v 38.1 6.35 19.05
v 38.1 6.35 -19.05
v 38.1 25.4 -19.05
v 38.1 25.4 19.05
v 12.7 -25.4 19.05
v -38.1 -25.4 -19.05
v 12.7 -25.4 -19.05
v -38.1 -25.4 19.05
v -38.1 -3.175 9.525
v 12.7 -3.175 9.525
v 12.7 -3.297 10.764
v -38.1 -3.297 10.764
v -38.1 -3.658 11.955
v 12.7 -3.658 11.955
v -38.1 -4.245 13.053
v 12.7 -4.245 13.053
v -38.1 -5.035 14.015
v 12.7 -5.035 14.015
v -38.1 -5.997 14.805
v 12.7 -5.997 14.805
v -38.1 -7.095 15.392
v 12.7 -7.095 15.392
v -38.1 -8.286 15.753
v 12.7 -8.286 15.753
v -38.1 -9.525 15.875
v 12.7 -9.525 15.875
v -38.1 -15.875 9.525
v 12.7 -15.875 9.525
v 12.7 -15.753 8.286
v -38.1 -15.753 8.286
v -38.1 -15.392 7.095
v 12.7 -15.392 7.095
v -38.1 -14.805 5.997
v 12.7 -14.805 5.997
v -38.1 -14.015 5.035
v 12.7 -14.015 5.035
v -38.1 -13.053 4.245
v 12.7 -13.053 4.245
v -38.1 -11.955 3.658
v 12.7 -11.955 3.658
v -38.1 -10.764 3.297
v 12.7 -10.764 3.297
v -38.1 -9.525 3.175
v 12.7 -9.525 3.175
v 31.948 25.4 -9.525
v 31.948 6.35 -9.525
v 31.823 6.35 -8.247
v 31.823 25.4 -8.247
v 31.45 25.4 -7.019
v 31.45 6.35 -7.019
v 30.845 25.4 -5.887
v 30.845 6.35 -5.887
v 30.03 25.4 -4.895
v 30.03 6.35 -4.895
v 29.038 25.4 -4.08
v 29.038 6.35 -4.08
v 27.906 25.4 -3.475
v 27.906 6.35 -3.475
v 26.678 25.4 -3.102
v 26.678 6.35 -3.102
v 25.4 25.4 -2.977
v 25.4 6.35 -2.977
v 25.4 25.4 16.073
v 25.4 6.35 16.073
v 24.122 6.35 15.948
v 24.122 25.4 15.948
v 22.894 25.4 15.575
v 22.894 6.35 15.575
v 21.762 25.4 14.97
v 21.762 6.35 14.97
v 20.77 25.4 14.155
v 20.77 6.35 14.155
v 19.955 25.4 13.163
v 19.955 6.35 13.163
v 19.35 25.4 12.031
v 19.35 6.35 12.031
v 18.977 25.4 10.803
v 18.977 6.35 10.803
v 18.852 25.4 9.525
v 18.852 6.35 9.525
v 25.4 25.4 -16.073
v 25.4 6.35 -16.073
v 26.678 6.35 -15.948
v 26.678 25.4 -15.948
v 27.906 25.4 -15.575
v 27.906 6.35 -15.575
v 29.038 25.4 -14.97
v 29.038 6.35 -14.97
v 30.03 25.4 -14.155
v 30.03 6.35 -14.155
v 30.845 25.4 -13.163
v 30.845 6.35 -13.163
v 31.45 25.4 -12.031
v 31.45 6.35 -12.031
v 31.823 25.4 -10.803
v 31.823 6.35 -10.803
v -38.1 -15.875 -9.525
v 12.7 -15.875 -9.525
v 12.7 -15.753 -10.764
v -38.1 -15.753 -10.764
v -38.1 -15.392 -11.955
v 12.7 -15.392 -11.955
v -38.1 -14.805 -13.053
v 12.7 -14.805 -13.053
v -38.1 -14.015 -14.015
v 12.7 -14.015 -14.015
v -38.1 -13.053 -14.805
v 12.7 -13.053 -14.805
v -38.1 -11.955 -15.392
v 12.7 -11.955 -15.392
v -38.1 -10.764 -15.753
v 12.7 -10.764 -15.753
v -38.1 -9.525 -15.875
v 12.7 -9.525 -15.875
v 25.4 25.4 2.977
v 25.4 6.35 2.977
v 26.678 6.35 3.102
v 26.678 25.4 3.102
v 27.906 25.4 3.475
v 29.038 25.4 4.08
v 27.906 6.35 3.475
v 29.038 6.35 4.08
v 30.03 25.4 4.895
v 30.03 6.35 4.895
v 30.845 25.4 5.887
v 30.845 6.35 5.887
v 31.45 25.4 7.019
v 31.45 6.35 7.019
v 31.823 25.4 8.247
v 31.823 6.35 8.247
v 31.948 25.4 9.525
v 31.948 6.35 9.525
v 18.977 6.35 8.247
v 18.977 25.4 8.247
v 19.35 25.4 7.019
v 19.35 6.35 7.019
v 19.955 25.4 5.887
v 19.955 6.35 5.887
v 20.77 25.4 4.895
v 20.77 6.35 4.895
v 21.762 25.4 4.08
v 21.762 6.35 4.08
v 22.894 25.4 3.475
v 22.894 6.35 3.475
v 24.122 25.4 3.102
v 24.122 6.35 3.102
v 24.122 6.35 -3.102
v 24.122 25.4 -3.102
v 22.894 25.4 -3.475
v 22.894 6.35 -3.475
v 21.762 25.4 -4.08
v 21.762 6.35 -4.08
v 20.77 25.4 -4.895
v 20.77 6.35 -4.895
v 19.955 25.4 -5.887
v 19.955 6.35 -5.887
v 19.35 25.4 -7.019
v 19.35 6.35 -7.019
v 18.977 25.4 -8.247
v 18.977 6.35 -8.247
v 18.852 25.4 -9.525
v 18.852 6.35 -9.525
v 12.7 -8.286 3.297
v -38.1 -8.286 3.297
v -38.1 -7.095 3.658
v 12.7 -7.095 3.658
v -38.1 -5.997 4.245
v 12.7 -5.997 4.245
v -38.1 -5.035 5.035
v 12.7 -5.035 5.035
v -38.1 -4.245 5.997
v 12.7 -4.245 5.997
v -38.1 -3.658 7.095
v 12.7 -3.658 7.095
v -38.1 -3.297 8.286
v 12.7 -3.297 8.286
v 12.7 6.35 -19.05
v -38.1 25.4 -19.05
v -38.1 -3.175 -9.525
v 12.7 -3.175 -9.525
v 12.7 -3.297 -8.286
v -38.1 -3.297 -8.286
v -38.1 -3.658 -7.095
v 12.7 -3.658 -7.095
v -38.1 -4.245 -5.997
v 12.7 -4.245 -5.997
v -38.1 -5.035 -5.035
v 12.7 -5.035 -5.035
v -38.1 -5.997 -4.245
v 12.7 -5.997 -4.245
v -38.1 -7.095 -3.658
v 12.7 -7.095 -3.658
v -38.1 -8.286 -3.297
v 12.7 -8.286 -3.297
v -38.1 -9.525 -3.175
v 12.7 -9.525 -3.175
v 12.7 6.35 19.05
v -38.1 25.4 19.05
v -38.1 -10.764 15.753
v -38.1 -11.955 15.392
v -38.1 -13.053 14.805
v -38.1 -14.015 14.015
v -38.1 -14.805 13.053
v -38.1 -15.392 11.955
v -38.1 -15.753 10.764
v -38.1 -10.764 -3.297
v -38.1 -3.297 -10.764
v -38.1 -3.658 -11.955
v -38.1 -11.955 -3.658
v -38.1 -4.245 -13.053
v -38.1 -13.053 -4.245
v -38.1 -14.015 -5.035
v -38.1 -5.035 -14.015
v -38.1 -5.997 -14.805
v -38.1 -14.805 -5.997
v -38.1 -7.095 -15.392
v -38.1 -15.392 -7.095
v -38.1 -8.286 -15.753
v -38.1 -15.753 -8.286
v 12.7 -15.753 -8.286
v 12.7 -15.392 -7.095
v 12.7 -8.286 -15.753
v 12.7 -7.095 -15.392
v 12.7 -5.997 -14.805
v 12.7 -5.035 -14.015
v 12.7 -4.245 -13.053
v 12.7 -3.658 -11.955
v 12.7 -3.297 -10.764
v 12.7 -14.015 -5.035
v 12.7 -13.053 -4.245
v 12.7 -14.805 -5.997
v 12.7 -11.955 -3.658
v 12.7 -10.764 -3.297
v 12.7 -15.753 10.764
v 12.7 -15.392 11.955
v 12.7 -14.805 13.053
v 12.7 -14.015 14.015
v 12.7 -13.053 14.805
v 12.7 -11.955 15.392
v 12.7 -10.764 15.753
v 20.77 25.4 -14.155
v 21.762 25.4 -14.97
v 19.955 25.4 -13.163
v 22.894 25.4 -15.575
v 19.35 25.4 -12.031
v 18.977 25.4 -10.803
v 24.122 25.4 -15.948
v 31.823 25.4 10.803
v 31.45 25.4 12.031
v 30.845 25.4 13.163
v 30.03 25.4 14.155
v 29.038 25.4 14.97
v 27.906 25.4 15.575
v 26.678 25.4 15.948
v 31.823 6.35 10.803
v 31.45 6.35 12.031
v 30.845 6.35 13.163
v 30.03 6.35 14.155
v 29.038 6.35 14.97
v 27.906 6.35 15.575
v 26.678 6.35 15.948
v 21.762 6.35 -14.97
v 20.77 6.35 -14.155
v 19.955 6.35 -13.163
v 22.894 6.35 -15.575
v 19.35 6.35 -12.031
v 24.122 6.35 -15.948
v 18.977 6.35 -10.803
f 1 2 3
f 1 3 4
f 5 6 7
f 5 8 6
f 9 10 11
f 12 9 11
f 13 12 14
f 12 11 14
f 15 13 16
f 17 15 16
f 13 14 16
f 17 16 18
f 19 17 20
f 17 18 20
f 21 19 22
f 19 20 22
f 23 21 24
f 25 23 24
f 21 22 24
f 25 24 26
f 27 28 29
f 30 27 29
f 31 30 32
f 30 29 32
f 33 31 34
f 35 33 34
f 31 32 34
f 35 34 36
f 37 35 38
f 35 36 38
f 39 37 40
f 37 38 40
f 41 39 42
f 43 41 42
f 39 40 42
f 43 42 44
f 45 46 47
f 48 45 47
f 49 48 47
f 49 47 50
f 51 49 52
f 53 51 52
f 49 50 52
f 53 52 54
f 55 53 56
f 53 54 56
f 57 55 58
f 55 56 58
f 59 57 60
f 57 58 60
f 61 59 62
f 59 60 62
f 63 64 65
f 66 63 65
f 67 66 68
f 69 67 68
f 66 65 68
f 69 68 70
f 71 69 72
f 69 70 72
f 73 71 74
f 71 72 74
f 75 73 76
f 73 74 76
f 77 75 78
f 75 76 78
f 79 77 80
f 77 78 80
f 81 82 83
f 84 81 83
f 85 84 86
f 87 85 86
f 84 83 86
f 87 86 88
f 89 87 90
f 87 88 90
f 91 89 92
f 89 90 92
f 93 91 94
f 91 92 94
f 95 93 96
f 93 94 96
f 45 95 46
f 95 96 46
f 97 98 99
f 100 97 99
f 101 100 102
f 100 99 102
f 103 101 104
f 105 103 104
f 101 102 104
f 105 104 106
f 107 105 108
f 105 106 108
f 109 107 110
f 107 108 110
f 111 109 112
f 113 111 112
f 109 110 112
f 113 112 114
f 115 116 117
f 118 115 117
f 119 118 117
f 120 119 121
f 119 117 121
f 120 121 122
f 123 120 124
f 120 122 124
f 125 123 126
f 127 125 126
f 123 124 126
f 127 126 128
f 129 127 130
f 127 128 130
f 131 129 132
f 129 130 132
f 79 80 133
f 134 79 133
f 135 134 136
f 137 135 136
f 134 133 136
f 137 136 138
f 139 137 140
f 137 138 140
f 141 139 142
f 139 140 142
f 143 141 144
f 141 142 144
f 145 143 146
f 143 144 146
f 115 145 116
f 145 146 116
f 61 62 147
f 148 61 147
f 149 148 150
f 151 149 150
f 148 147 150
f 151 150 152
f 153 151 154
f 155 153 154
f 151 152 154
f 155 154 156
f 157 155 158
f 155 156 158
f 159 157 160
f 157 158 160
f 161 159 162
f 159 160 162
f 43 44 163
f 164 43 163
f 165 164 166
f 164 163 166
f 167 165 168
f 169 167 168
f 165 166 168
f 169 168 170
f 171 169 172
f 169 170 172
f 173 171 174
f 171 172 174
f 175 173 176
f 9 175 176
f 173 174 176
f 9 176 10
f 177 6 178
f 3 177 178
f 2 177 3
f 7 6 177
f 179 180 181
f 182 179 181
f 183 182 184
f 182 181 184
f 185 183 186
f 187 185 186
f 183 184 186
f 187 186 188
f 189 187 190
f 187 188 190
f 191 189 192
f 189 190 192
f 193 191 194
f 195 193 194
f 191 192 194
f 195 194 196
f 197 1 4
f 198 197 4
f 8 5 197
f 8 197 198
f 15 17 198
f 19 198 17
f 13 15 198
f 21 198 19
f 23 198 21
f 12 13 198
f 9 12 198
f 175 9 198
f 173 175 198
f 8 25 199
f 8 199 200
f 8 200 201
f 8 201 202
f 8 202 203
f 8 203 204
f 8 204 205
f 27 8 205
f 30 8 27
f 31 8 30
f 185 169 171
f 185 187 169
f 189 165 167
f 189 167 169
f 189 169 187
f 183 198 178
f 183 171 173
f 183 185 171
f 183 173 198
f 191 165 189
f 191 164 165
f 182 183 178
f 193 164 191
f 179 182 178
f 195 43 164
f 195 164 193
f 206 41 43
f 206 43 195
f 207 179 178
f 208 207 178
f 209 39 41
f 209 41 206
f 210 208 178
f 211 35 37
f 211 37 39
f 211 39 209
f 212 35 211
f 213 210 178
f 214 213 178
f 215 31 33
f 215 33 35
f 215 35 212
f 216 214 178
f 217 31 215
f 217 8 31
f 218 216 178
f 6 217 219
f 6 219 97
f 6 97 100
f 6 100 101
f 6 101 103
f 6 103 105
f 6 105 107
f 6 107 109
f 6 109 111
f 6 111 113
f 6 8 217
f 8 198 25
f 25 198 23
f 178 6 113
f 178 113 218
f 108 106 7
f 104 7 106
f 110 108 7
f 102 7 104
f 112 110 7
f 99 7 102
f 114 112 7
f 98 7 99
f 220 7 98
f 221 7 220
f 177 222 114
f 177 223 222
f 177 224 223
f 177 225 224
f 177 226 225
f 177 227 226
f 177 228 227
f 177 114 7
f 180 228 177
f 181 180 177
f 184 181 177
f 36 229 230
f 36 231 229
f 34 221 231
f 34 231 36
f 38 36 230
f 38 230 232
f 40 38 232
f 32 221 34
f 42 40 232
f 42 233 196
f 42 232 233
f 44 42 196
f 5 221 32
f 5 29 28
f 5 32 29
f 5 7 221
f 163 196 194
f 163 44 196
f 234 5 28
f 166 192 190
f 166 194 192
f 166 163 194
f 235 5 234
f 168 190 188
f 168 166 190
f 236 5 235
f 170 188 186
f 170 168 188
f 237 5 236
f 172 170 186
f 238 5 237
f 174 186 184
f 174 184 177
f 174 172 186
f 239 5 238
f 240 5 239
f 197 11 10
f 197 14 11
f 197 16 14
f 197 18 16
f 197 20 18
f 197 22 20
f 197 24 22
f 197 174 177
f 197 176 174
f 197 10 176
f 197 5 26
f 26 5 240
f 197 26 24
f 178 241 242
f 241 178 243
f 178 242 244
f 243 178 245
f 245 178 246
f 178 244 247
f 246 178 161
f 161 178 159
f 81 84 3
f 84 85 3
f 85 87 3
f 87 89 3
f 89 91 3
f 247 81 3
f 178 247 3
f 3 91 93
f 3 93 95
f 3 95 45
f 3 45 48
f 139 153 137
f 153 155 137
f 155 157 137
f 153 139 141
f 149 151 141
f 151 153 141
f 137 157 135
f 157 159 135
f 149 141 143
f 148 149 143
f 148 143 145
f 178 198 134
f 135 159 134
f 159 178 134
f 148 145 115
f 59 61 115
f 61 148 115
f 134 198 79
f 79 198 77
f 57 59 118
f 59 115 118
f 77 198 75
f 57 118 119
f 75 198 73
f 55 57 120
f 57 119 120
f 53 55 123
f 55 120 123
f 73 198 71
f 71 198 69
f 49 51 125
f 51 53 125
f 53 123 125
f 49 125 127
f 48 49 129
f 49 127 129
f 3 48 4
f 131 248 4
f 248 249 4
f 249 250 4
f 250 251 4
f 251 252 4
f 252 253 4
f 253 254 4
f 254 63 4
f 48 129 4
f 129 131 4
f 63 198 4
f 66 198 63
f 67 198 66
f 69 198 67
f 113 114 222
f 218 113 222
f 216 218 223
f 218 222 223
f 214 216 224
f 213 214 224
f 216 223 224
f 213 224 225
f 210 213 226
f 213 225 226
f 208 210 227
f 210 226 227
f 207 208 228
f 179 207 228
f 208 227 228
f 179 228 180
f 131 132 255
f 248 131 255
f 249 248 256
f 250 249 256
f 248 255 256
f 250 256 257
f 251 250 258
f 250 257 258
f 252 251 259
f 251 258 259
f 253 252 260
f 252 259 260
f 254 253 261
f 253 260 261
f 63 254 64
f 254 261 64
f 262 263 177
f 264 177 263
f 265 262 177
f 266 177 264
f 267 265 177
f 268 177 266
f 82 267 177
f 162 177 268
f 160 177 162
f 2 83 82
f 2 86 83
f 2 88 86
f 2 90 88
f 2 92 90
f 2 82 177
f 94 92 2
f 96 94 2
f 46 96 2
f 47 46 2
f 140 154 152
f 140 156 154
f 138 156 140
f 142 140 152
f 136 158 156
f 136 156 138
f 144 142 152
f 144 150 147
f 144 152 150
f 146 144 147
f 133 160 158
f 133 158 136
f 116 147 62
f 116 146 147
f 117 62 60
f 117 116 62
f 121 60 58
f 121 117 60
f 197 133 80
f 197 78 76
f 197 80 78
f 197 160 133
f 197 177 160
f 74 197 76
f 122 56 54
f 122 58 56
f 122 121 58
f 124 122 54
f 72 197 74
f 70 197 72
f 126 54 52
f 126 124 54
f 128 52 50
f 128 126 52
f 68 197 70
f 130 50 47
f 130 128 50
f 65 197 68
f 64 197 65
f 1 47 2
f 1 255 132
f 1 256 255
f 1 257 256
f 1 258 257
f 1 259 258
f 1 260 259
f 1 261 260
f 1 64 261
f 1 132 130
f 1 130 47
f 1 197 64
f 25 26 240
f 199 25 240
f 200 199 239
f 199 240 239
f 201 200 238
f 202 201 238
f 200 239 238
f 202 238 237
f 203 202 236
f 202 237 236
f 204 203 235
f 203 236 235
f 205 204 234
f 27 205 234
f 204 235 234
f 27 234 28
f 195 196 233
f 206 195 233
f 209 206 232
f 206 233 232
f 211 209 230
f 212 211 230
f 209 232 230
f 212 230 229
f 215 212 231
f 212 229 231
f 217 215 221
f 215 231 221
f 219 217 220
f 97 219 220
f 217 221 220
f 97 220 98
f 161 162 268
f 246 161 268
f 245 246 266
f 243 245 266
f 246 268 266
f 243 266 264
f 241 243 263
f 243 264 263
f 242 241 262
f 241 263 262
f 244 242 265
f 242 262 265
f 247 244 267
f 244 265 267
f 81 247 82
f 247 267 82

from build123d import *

# Parameters (mm, degrees)
F0_W     = 12.7
F0_H     = 9.525
F0_H_2   = 19.05
F1_DEPTH = 25.4
F2_W     = 25.4
F2_H     = 31.75
F3_DEPTH = 38.101
F5_DEPTH = 19.051
F7_DEPTH = 50.801


with BuildPart() as f1:
    # F0 (on Front) → F1 (new body, symmetric)
    with BuildSketch(Plane.XZ):
        with Locations((31.75, -14.2875)):
            Rectangle(F0_W, F0_H)
        with Locations((19.05, -14.2875)):
            Rectangle(F0_W, F0_H)
        with Locations((31.75, 0)):
            Rectangle(F0_W, F0_H_2)
        Polygon((-38.1, -19.05), (12.7, -19.05), (12.7, -9.525), (12.7, 9.525), (12.7, 19.05), (-38.1, 19.05), align=None)
        with Locations((31.75, 14.2875)):
            Rectangle(F0_W, F0_H)
        with Locations((19.05, 14.2875)):
            Rectangle(F0_W, F0_H)
        with Locations((19.05, 0)):
            Rectangle(F0_W, F0_H_2)
    extrude(amount=F1_DEPTH, both=True)

    # F2 (on face) → F3 (cut, through all)
    with BuildSketch(Plane.XY.offset(19.05)):
        with Locations((25.4, -9.525)):
            Rectangle(F2_W, F2_H)
    extrude(amount=-F3_DEPTH, mode=Mode.SUBTRACT)

    # F4 (on face) → F5 (cut, through all)
    with BuildSketch(Plane.XZ.offset(-6.35)):
        with BuildLine():
            ThreePointArc((31.9484375, 9.525), (30.0304445624, 14.1554445624), (25.4, 16.0734375))
            Line((25.4, 16.0734375), (25.4, 9.525))
            Line((25.4, 9.525), (31.9484375, 9.525))
        make_face()
        with BuildLine():
            ThreePointArc((31.9484375, -9.525), (30.0304445624, -4.8945554376), (25.4, -2.9765625))
            Line((25.4, -2.9765625), (25.4, -9.525))
            Line((25.4, -9.525), (31.9484375, -9.525))
        make_face()
        with BuildLine():
            Line((25.4, -9.525), (25.4, -2.9765625))
            ThreePointArc((25.4, -2.9765625), (20.7695554376, -4.8945554376), (18.8515625, -9.525))
            Line((18.8515625, -9.525), (25.4, -9.525))
        make_face()
        with BuildLine():
            Line((25.4, 9.525), (25.4, 16.0734375))
            ThreePointArc((25.4, 16.0734375), (20.7695554376, 14.1554445624), (18.8515625, 9.525))
            Line((18.8515625, 9.525), (25.4, 9.525))
        make_face()
        with BuildLine():
            Line((31.9484375, 9.525), (25.4, 9.525))
            Line((25.4, 9.525), (25.4, 2.9765625))
            ThreePointArc((25.4, 2.9765625), (30.0304445624, 4.8945554376), (31.9484375, 9.525))
        make_face()
        with BuildLine():
            Line((25.4, 2.9765625), (25.4, 9.525))
            Line((25.4, 9.525), (18.8515625, 9.525))
            ThreePointArc((18.8515625, 9.525), (20.7695554376, 4.8945554376), (25.4, 2.9765625))
        make_face()
        with BuildLine():
            Line((31.9484375, -9.525), (25.4, -9.525))
            Line((25.4, -9.525), (25.4, -16.0734375))
            ThreePointArc((25.4, -16.0734375), (30.0304445624, -14.1554445624), (31.9484375, -9.525))
        make_face()
        with BuildLine():
            Line((25.4, -16.0734375), (25.4, -9.525))
            Line((25.4, -9.525), (18.8515625, -9.525))
            ThreePointArc((18.8515625, -9.525), (20.7695554376, -14.1554445624), (25.4, -16.0734375))
        make_face()
    extrude(amount=-F5_DEPTH, mode=Mode.SUBTRACT)

    # F6 (on face) → F7 (cut, through all)
    with BuildSketch(Plane.YZ.offset(12.7)):
        with BuildLine():
            ThreePointArc((-3.175, 9.525), (-5.0348719395, 14.0151280605), (-9.525, 15.875))
            Line((-9.525, 15.875), (-9.525, 9.525))
            Line((-9.525, 9.525), (-3.175, 9.525))
        make_face()
        with BuildLine():
            ThreePointArc((-3.175, -9.525), (-5.0348719395, -5.0348719395), (-9.525, -3.175))
            Line((-9.525, -3.175), (-9.525, -9.525))
            Line((-9.525, -9.525), (-3.175, -9.525))
        make_face()
        with BuildLine():
            Line((-9.525, -9.525), (-9.525, -3.175))
            ThreePointArc((-9.525, -3.175), (-14.0151280605, -5.0348719395), (-15.875, -9.525))
            Line((-15.875, -9.525), (-9.525, -9.525))
        make_face()
        with BuildLine():
            Line((-9.525, 9.525), (-9.525, 15.875))
            ThreePointArc((-9.525, 15.875), (-14.0151280605, 14.0151280605), (-15.875, 9.525))
            Line((-15.875, 9.525), (-9.525, 9.525))
        make_face()
        with BuildLine():
            Line((-3.175, 9.525), (-9.525, 9.525))
            Line((-9.525, 9.525), (-9.525, 3.175))
            ThreePointArc((-9.525, 3.175), (-5.0348719395, 5.0348719395), (-3.175, 9.525))
        make_face()
        with BuildLine():
            Line((-9.525, 3.175), (-9.525, 9.525))
            Line((-9.525, 9.525), (-15.875, 9.525))
            ThreePointArc((-15.875, 9.525), (-14.0151280605, 5.0348719395), (-9.525, 3.175))
        make_face()
        with BuildLine():
            Line((-3.175, -9.525), (-9.525, -9.525))
            Line((-9.525, -9.525), (-9.525, -15.875))
            ThreePointArc((-9.525, -15.875), (-5.0348719395, -14.0151280605), (-3.175, -9.525))
        make_face()
        with BuildLine():
            Line((-9.525, -15.875), (-9.525, -9.525))
            Line((-9.525, -9.525), (-15.875, -9.525))
            ThreePointArc((-15.875, -9.525), (-14.0151280605, -14.0151280605), (-9.525, -15.875))
        make_face()
    extrude(amount=-F7_DEPTH, mode=Mode.SUBTRACT)


solid = f1.part
